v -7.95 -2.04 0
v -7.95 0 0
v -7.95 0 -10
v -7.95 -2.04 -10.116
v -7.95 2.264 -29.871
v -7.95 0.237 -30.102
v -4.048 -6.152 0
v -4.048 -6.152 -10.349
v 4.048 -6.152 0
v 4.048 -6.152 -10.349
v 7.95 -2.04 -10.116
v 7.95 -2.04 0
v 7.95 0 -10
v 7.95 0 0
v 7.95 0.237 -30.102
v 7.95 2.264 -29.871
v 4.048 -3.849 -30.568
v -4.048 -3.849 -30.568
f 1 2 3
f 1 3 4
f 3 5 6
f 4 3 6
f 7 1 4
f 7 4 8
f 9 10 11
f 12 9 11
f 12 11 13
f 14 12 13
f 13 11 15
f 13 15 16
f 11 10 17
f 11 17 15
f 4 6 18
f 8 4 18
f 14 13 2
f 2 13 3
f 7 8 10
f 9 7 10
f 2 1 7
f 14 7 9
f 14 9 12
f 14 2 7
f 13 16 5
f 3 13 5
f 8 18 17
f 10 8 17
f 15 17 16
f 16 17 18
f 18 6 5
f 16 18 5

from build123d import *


with BuildPart() as part:
    # Sweep1: sweep along a path in Sketch2
    with BuildLine(Plane(origin=(0, 0, 0), x_dir=(0, 0, -1), z_dir=(1, 0, 0))) as sweep1_path:
        Line((0, 0), (10, 0))
        Line((10, 0), (29.871437114, 2.264064275))
    # Sketch1 → Sweep1 (sweep)
    with BuildSketch(Plane.XY):
        Polygon((7.95, 0), (7.95, -2.04), (4.048, -6.152414984), (-4.048, -6.152414984), (-7.95, -2.04), (-7.95, 0), align=None)
    sweep(path=sweep1_path.line, transition=Transition.RIGHT)


solid = part.part
